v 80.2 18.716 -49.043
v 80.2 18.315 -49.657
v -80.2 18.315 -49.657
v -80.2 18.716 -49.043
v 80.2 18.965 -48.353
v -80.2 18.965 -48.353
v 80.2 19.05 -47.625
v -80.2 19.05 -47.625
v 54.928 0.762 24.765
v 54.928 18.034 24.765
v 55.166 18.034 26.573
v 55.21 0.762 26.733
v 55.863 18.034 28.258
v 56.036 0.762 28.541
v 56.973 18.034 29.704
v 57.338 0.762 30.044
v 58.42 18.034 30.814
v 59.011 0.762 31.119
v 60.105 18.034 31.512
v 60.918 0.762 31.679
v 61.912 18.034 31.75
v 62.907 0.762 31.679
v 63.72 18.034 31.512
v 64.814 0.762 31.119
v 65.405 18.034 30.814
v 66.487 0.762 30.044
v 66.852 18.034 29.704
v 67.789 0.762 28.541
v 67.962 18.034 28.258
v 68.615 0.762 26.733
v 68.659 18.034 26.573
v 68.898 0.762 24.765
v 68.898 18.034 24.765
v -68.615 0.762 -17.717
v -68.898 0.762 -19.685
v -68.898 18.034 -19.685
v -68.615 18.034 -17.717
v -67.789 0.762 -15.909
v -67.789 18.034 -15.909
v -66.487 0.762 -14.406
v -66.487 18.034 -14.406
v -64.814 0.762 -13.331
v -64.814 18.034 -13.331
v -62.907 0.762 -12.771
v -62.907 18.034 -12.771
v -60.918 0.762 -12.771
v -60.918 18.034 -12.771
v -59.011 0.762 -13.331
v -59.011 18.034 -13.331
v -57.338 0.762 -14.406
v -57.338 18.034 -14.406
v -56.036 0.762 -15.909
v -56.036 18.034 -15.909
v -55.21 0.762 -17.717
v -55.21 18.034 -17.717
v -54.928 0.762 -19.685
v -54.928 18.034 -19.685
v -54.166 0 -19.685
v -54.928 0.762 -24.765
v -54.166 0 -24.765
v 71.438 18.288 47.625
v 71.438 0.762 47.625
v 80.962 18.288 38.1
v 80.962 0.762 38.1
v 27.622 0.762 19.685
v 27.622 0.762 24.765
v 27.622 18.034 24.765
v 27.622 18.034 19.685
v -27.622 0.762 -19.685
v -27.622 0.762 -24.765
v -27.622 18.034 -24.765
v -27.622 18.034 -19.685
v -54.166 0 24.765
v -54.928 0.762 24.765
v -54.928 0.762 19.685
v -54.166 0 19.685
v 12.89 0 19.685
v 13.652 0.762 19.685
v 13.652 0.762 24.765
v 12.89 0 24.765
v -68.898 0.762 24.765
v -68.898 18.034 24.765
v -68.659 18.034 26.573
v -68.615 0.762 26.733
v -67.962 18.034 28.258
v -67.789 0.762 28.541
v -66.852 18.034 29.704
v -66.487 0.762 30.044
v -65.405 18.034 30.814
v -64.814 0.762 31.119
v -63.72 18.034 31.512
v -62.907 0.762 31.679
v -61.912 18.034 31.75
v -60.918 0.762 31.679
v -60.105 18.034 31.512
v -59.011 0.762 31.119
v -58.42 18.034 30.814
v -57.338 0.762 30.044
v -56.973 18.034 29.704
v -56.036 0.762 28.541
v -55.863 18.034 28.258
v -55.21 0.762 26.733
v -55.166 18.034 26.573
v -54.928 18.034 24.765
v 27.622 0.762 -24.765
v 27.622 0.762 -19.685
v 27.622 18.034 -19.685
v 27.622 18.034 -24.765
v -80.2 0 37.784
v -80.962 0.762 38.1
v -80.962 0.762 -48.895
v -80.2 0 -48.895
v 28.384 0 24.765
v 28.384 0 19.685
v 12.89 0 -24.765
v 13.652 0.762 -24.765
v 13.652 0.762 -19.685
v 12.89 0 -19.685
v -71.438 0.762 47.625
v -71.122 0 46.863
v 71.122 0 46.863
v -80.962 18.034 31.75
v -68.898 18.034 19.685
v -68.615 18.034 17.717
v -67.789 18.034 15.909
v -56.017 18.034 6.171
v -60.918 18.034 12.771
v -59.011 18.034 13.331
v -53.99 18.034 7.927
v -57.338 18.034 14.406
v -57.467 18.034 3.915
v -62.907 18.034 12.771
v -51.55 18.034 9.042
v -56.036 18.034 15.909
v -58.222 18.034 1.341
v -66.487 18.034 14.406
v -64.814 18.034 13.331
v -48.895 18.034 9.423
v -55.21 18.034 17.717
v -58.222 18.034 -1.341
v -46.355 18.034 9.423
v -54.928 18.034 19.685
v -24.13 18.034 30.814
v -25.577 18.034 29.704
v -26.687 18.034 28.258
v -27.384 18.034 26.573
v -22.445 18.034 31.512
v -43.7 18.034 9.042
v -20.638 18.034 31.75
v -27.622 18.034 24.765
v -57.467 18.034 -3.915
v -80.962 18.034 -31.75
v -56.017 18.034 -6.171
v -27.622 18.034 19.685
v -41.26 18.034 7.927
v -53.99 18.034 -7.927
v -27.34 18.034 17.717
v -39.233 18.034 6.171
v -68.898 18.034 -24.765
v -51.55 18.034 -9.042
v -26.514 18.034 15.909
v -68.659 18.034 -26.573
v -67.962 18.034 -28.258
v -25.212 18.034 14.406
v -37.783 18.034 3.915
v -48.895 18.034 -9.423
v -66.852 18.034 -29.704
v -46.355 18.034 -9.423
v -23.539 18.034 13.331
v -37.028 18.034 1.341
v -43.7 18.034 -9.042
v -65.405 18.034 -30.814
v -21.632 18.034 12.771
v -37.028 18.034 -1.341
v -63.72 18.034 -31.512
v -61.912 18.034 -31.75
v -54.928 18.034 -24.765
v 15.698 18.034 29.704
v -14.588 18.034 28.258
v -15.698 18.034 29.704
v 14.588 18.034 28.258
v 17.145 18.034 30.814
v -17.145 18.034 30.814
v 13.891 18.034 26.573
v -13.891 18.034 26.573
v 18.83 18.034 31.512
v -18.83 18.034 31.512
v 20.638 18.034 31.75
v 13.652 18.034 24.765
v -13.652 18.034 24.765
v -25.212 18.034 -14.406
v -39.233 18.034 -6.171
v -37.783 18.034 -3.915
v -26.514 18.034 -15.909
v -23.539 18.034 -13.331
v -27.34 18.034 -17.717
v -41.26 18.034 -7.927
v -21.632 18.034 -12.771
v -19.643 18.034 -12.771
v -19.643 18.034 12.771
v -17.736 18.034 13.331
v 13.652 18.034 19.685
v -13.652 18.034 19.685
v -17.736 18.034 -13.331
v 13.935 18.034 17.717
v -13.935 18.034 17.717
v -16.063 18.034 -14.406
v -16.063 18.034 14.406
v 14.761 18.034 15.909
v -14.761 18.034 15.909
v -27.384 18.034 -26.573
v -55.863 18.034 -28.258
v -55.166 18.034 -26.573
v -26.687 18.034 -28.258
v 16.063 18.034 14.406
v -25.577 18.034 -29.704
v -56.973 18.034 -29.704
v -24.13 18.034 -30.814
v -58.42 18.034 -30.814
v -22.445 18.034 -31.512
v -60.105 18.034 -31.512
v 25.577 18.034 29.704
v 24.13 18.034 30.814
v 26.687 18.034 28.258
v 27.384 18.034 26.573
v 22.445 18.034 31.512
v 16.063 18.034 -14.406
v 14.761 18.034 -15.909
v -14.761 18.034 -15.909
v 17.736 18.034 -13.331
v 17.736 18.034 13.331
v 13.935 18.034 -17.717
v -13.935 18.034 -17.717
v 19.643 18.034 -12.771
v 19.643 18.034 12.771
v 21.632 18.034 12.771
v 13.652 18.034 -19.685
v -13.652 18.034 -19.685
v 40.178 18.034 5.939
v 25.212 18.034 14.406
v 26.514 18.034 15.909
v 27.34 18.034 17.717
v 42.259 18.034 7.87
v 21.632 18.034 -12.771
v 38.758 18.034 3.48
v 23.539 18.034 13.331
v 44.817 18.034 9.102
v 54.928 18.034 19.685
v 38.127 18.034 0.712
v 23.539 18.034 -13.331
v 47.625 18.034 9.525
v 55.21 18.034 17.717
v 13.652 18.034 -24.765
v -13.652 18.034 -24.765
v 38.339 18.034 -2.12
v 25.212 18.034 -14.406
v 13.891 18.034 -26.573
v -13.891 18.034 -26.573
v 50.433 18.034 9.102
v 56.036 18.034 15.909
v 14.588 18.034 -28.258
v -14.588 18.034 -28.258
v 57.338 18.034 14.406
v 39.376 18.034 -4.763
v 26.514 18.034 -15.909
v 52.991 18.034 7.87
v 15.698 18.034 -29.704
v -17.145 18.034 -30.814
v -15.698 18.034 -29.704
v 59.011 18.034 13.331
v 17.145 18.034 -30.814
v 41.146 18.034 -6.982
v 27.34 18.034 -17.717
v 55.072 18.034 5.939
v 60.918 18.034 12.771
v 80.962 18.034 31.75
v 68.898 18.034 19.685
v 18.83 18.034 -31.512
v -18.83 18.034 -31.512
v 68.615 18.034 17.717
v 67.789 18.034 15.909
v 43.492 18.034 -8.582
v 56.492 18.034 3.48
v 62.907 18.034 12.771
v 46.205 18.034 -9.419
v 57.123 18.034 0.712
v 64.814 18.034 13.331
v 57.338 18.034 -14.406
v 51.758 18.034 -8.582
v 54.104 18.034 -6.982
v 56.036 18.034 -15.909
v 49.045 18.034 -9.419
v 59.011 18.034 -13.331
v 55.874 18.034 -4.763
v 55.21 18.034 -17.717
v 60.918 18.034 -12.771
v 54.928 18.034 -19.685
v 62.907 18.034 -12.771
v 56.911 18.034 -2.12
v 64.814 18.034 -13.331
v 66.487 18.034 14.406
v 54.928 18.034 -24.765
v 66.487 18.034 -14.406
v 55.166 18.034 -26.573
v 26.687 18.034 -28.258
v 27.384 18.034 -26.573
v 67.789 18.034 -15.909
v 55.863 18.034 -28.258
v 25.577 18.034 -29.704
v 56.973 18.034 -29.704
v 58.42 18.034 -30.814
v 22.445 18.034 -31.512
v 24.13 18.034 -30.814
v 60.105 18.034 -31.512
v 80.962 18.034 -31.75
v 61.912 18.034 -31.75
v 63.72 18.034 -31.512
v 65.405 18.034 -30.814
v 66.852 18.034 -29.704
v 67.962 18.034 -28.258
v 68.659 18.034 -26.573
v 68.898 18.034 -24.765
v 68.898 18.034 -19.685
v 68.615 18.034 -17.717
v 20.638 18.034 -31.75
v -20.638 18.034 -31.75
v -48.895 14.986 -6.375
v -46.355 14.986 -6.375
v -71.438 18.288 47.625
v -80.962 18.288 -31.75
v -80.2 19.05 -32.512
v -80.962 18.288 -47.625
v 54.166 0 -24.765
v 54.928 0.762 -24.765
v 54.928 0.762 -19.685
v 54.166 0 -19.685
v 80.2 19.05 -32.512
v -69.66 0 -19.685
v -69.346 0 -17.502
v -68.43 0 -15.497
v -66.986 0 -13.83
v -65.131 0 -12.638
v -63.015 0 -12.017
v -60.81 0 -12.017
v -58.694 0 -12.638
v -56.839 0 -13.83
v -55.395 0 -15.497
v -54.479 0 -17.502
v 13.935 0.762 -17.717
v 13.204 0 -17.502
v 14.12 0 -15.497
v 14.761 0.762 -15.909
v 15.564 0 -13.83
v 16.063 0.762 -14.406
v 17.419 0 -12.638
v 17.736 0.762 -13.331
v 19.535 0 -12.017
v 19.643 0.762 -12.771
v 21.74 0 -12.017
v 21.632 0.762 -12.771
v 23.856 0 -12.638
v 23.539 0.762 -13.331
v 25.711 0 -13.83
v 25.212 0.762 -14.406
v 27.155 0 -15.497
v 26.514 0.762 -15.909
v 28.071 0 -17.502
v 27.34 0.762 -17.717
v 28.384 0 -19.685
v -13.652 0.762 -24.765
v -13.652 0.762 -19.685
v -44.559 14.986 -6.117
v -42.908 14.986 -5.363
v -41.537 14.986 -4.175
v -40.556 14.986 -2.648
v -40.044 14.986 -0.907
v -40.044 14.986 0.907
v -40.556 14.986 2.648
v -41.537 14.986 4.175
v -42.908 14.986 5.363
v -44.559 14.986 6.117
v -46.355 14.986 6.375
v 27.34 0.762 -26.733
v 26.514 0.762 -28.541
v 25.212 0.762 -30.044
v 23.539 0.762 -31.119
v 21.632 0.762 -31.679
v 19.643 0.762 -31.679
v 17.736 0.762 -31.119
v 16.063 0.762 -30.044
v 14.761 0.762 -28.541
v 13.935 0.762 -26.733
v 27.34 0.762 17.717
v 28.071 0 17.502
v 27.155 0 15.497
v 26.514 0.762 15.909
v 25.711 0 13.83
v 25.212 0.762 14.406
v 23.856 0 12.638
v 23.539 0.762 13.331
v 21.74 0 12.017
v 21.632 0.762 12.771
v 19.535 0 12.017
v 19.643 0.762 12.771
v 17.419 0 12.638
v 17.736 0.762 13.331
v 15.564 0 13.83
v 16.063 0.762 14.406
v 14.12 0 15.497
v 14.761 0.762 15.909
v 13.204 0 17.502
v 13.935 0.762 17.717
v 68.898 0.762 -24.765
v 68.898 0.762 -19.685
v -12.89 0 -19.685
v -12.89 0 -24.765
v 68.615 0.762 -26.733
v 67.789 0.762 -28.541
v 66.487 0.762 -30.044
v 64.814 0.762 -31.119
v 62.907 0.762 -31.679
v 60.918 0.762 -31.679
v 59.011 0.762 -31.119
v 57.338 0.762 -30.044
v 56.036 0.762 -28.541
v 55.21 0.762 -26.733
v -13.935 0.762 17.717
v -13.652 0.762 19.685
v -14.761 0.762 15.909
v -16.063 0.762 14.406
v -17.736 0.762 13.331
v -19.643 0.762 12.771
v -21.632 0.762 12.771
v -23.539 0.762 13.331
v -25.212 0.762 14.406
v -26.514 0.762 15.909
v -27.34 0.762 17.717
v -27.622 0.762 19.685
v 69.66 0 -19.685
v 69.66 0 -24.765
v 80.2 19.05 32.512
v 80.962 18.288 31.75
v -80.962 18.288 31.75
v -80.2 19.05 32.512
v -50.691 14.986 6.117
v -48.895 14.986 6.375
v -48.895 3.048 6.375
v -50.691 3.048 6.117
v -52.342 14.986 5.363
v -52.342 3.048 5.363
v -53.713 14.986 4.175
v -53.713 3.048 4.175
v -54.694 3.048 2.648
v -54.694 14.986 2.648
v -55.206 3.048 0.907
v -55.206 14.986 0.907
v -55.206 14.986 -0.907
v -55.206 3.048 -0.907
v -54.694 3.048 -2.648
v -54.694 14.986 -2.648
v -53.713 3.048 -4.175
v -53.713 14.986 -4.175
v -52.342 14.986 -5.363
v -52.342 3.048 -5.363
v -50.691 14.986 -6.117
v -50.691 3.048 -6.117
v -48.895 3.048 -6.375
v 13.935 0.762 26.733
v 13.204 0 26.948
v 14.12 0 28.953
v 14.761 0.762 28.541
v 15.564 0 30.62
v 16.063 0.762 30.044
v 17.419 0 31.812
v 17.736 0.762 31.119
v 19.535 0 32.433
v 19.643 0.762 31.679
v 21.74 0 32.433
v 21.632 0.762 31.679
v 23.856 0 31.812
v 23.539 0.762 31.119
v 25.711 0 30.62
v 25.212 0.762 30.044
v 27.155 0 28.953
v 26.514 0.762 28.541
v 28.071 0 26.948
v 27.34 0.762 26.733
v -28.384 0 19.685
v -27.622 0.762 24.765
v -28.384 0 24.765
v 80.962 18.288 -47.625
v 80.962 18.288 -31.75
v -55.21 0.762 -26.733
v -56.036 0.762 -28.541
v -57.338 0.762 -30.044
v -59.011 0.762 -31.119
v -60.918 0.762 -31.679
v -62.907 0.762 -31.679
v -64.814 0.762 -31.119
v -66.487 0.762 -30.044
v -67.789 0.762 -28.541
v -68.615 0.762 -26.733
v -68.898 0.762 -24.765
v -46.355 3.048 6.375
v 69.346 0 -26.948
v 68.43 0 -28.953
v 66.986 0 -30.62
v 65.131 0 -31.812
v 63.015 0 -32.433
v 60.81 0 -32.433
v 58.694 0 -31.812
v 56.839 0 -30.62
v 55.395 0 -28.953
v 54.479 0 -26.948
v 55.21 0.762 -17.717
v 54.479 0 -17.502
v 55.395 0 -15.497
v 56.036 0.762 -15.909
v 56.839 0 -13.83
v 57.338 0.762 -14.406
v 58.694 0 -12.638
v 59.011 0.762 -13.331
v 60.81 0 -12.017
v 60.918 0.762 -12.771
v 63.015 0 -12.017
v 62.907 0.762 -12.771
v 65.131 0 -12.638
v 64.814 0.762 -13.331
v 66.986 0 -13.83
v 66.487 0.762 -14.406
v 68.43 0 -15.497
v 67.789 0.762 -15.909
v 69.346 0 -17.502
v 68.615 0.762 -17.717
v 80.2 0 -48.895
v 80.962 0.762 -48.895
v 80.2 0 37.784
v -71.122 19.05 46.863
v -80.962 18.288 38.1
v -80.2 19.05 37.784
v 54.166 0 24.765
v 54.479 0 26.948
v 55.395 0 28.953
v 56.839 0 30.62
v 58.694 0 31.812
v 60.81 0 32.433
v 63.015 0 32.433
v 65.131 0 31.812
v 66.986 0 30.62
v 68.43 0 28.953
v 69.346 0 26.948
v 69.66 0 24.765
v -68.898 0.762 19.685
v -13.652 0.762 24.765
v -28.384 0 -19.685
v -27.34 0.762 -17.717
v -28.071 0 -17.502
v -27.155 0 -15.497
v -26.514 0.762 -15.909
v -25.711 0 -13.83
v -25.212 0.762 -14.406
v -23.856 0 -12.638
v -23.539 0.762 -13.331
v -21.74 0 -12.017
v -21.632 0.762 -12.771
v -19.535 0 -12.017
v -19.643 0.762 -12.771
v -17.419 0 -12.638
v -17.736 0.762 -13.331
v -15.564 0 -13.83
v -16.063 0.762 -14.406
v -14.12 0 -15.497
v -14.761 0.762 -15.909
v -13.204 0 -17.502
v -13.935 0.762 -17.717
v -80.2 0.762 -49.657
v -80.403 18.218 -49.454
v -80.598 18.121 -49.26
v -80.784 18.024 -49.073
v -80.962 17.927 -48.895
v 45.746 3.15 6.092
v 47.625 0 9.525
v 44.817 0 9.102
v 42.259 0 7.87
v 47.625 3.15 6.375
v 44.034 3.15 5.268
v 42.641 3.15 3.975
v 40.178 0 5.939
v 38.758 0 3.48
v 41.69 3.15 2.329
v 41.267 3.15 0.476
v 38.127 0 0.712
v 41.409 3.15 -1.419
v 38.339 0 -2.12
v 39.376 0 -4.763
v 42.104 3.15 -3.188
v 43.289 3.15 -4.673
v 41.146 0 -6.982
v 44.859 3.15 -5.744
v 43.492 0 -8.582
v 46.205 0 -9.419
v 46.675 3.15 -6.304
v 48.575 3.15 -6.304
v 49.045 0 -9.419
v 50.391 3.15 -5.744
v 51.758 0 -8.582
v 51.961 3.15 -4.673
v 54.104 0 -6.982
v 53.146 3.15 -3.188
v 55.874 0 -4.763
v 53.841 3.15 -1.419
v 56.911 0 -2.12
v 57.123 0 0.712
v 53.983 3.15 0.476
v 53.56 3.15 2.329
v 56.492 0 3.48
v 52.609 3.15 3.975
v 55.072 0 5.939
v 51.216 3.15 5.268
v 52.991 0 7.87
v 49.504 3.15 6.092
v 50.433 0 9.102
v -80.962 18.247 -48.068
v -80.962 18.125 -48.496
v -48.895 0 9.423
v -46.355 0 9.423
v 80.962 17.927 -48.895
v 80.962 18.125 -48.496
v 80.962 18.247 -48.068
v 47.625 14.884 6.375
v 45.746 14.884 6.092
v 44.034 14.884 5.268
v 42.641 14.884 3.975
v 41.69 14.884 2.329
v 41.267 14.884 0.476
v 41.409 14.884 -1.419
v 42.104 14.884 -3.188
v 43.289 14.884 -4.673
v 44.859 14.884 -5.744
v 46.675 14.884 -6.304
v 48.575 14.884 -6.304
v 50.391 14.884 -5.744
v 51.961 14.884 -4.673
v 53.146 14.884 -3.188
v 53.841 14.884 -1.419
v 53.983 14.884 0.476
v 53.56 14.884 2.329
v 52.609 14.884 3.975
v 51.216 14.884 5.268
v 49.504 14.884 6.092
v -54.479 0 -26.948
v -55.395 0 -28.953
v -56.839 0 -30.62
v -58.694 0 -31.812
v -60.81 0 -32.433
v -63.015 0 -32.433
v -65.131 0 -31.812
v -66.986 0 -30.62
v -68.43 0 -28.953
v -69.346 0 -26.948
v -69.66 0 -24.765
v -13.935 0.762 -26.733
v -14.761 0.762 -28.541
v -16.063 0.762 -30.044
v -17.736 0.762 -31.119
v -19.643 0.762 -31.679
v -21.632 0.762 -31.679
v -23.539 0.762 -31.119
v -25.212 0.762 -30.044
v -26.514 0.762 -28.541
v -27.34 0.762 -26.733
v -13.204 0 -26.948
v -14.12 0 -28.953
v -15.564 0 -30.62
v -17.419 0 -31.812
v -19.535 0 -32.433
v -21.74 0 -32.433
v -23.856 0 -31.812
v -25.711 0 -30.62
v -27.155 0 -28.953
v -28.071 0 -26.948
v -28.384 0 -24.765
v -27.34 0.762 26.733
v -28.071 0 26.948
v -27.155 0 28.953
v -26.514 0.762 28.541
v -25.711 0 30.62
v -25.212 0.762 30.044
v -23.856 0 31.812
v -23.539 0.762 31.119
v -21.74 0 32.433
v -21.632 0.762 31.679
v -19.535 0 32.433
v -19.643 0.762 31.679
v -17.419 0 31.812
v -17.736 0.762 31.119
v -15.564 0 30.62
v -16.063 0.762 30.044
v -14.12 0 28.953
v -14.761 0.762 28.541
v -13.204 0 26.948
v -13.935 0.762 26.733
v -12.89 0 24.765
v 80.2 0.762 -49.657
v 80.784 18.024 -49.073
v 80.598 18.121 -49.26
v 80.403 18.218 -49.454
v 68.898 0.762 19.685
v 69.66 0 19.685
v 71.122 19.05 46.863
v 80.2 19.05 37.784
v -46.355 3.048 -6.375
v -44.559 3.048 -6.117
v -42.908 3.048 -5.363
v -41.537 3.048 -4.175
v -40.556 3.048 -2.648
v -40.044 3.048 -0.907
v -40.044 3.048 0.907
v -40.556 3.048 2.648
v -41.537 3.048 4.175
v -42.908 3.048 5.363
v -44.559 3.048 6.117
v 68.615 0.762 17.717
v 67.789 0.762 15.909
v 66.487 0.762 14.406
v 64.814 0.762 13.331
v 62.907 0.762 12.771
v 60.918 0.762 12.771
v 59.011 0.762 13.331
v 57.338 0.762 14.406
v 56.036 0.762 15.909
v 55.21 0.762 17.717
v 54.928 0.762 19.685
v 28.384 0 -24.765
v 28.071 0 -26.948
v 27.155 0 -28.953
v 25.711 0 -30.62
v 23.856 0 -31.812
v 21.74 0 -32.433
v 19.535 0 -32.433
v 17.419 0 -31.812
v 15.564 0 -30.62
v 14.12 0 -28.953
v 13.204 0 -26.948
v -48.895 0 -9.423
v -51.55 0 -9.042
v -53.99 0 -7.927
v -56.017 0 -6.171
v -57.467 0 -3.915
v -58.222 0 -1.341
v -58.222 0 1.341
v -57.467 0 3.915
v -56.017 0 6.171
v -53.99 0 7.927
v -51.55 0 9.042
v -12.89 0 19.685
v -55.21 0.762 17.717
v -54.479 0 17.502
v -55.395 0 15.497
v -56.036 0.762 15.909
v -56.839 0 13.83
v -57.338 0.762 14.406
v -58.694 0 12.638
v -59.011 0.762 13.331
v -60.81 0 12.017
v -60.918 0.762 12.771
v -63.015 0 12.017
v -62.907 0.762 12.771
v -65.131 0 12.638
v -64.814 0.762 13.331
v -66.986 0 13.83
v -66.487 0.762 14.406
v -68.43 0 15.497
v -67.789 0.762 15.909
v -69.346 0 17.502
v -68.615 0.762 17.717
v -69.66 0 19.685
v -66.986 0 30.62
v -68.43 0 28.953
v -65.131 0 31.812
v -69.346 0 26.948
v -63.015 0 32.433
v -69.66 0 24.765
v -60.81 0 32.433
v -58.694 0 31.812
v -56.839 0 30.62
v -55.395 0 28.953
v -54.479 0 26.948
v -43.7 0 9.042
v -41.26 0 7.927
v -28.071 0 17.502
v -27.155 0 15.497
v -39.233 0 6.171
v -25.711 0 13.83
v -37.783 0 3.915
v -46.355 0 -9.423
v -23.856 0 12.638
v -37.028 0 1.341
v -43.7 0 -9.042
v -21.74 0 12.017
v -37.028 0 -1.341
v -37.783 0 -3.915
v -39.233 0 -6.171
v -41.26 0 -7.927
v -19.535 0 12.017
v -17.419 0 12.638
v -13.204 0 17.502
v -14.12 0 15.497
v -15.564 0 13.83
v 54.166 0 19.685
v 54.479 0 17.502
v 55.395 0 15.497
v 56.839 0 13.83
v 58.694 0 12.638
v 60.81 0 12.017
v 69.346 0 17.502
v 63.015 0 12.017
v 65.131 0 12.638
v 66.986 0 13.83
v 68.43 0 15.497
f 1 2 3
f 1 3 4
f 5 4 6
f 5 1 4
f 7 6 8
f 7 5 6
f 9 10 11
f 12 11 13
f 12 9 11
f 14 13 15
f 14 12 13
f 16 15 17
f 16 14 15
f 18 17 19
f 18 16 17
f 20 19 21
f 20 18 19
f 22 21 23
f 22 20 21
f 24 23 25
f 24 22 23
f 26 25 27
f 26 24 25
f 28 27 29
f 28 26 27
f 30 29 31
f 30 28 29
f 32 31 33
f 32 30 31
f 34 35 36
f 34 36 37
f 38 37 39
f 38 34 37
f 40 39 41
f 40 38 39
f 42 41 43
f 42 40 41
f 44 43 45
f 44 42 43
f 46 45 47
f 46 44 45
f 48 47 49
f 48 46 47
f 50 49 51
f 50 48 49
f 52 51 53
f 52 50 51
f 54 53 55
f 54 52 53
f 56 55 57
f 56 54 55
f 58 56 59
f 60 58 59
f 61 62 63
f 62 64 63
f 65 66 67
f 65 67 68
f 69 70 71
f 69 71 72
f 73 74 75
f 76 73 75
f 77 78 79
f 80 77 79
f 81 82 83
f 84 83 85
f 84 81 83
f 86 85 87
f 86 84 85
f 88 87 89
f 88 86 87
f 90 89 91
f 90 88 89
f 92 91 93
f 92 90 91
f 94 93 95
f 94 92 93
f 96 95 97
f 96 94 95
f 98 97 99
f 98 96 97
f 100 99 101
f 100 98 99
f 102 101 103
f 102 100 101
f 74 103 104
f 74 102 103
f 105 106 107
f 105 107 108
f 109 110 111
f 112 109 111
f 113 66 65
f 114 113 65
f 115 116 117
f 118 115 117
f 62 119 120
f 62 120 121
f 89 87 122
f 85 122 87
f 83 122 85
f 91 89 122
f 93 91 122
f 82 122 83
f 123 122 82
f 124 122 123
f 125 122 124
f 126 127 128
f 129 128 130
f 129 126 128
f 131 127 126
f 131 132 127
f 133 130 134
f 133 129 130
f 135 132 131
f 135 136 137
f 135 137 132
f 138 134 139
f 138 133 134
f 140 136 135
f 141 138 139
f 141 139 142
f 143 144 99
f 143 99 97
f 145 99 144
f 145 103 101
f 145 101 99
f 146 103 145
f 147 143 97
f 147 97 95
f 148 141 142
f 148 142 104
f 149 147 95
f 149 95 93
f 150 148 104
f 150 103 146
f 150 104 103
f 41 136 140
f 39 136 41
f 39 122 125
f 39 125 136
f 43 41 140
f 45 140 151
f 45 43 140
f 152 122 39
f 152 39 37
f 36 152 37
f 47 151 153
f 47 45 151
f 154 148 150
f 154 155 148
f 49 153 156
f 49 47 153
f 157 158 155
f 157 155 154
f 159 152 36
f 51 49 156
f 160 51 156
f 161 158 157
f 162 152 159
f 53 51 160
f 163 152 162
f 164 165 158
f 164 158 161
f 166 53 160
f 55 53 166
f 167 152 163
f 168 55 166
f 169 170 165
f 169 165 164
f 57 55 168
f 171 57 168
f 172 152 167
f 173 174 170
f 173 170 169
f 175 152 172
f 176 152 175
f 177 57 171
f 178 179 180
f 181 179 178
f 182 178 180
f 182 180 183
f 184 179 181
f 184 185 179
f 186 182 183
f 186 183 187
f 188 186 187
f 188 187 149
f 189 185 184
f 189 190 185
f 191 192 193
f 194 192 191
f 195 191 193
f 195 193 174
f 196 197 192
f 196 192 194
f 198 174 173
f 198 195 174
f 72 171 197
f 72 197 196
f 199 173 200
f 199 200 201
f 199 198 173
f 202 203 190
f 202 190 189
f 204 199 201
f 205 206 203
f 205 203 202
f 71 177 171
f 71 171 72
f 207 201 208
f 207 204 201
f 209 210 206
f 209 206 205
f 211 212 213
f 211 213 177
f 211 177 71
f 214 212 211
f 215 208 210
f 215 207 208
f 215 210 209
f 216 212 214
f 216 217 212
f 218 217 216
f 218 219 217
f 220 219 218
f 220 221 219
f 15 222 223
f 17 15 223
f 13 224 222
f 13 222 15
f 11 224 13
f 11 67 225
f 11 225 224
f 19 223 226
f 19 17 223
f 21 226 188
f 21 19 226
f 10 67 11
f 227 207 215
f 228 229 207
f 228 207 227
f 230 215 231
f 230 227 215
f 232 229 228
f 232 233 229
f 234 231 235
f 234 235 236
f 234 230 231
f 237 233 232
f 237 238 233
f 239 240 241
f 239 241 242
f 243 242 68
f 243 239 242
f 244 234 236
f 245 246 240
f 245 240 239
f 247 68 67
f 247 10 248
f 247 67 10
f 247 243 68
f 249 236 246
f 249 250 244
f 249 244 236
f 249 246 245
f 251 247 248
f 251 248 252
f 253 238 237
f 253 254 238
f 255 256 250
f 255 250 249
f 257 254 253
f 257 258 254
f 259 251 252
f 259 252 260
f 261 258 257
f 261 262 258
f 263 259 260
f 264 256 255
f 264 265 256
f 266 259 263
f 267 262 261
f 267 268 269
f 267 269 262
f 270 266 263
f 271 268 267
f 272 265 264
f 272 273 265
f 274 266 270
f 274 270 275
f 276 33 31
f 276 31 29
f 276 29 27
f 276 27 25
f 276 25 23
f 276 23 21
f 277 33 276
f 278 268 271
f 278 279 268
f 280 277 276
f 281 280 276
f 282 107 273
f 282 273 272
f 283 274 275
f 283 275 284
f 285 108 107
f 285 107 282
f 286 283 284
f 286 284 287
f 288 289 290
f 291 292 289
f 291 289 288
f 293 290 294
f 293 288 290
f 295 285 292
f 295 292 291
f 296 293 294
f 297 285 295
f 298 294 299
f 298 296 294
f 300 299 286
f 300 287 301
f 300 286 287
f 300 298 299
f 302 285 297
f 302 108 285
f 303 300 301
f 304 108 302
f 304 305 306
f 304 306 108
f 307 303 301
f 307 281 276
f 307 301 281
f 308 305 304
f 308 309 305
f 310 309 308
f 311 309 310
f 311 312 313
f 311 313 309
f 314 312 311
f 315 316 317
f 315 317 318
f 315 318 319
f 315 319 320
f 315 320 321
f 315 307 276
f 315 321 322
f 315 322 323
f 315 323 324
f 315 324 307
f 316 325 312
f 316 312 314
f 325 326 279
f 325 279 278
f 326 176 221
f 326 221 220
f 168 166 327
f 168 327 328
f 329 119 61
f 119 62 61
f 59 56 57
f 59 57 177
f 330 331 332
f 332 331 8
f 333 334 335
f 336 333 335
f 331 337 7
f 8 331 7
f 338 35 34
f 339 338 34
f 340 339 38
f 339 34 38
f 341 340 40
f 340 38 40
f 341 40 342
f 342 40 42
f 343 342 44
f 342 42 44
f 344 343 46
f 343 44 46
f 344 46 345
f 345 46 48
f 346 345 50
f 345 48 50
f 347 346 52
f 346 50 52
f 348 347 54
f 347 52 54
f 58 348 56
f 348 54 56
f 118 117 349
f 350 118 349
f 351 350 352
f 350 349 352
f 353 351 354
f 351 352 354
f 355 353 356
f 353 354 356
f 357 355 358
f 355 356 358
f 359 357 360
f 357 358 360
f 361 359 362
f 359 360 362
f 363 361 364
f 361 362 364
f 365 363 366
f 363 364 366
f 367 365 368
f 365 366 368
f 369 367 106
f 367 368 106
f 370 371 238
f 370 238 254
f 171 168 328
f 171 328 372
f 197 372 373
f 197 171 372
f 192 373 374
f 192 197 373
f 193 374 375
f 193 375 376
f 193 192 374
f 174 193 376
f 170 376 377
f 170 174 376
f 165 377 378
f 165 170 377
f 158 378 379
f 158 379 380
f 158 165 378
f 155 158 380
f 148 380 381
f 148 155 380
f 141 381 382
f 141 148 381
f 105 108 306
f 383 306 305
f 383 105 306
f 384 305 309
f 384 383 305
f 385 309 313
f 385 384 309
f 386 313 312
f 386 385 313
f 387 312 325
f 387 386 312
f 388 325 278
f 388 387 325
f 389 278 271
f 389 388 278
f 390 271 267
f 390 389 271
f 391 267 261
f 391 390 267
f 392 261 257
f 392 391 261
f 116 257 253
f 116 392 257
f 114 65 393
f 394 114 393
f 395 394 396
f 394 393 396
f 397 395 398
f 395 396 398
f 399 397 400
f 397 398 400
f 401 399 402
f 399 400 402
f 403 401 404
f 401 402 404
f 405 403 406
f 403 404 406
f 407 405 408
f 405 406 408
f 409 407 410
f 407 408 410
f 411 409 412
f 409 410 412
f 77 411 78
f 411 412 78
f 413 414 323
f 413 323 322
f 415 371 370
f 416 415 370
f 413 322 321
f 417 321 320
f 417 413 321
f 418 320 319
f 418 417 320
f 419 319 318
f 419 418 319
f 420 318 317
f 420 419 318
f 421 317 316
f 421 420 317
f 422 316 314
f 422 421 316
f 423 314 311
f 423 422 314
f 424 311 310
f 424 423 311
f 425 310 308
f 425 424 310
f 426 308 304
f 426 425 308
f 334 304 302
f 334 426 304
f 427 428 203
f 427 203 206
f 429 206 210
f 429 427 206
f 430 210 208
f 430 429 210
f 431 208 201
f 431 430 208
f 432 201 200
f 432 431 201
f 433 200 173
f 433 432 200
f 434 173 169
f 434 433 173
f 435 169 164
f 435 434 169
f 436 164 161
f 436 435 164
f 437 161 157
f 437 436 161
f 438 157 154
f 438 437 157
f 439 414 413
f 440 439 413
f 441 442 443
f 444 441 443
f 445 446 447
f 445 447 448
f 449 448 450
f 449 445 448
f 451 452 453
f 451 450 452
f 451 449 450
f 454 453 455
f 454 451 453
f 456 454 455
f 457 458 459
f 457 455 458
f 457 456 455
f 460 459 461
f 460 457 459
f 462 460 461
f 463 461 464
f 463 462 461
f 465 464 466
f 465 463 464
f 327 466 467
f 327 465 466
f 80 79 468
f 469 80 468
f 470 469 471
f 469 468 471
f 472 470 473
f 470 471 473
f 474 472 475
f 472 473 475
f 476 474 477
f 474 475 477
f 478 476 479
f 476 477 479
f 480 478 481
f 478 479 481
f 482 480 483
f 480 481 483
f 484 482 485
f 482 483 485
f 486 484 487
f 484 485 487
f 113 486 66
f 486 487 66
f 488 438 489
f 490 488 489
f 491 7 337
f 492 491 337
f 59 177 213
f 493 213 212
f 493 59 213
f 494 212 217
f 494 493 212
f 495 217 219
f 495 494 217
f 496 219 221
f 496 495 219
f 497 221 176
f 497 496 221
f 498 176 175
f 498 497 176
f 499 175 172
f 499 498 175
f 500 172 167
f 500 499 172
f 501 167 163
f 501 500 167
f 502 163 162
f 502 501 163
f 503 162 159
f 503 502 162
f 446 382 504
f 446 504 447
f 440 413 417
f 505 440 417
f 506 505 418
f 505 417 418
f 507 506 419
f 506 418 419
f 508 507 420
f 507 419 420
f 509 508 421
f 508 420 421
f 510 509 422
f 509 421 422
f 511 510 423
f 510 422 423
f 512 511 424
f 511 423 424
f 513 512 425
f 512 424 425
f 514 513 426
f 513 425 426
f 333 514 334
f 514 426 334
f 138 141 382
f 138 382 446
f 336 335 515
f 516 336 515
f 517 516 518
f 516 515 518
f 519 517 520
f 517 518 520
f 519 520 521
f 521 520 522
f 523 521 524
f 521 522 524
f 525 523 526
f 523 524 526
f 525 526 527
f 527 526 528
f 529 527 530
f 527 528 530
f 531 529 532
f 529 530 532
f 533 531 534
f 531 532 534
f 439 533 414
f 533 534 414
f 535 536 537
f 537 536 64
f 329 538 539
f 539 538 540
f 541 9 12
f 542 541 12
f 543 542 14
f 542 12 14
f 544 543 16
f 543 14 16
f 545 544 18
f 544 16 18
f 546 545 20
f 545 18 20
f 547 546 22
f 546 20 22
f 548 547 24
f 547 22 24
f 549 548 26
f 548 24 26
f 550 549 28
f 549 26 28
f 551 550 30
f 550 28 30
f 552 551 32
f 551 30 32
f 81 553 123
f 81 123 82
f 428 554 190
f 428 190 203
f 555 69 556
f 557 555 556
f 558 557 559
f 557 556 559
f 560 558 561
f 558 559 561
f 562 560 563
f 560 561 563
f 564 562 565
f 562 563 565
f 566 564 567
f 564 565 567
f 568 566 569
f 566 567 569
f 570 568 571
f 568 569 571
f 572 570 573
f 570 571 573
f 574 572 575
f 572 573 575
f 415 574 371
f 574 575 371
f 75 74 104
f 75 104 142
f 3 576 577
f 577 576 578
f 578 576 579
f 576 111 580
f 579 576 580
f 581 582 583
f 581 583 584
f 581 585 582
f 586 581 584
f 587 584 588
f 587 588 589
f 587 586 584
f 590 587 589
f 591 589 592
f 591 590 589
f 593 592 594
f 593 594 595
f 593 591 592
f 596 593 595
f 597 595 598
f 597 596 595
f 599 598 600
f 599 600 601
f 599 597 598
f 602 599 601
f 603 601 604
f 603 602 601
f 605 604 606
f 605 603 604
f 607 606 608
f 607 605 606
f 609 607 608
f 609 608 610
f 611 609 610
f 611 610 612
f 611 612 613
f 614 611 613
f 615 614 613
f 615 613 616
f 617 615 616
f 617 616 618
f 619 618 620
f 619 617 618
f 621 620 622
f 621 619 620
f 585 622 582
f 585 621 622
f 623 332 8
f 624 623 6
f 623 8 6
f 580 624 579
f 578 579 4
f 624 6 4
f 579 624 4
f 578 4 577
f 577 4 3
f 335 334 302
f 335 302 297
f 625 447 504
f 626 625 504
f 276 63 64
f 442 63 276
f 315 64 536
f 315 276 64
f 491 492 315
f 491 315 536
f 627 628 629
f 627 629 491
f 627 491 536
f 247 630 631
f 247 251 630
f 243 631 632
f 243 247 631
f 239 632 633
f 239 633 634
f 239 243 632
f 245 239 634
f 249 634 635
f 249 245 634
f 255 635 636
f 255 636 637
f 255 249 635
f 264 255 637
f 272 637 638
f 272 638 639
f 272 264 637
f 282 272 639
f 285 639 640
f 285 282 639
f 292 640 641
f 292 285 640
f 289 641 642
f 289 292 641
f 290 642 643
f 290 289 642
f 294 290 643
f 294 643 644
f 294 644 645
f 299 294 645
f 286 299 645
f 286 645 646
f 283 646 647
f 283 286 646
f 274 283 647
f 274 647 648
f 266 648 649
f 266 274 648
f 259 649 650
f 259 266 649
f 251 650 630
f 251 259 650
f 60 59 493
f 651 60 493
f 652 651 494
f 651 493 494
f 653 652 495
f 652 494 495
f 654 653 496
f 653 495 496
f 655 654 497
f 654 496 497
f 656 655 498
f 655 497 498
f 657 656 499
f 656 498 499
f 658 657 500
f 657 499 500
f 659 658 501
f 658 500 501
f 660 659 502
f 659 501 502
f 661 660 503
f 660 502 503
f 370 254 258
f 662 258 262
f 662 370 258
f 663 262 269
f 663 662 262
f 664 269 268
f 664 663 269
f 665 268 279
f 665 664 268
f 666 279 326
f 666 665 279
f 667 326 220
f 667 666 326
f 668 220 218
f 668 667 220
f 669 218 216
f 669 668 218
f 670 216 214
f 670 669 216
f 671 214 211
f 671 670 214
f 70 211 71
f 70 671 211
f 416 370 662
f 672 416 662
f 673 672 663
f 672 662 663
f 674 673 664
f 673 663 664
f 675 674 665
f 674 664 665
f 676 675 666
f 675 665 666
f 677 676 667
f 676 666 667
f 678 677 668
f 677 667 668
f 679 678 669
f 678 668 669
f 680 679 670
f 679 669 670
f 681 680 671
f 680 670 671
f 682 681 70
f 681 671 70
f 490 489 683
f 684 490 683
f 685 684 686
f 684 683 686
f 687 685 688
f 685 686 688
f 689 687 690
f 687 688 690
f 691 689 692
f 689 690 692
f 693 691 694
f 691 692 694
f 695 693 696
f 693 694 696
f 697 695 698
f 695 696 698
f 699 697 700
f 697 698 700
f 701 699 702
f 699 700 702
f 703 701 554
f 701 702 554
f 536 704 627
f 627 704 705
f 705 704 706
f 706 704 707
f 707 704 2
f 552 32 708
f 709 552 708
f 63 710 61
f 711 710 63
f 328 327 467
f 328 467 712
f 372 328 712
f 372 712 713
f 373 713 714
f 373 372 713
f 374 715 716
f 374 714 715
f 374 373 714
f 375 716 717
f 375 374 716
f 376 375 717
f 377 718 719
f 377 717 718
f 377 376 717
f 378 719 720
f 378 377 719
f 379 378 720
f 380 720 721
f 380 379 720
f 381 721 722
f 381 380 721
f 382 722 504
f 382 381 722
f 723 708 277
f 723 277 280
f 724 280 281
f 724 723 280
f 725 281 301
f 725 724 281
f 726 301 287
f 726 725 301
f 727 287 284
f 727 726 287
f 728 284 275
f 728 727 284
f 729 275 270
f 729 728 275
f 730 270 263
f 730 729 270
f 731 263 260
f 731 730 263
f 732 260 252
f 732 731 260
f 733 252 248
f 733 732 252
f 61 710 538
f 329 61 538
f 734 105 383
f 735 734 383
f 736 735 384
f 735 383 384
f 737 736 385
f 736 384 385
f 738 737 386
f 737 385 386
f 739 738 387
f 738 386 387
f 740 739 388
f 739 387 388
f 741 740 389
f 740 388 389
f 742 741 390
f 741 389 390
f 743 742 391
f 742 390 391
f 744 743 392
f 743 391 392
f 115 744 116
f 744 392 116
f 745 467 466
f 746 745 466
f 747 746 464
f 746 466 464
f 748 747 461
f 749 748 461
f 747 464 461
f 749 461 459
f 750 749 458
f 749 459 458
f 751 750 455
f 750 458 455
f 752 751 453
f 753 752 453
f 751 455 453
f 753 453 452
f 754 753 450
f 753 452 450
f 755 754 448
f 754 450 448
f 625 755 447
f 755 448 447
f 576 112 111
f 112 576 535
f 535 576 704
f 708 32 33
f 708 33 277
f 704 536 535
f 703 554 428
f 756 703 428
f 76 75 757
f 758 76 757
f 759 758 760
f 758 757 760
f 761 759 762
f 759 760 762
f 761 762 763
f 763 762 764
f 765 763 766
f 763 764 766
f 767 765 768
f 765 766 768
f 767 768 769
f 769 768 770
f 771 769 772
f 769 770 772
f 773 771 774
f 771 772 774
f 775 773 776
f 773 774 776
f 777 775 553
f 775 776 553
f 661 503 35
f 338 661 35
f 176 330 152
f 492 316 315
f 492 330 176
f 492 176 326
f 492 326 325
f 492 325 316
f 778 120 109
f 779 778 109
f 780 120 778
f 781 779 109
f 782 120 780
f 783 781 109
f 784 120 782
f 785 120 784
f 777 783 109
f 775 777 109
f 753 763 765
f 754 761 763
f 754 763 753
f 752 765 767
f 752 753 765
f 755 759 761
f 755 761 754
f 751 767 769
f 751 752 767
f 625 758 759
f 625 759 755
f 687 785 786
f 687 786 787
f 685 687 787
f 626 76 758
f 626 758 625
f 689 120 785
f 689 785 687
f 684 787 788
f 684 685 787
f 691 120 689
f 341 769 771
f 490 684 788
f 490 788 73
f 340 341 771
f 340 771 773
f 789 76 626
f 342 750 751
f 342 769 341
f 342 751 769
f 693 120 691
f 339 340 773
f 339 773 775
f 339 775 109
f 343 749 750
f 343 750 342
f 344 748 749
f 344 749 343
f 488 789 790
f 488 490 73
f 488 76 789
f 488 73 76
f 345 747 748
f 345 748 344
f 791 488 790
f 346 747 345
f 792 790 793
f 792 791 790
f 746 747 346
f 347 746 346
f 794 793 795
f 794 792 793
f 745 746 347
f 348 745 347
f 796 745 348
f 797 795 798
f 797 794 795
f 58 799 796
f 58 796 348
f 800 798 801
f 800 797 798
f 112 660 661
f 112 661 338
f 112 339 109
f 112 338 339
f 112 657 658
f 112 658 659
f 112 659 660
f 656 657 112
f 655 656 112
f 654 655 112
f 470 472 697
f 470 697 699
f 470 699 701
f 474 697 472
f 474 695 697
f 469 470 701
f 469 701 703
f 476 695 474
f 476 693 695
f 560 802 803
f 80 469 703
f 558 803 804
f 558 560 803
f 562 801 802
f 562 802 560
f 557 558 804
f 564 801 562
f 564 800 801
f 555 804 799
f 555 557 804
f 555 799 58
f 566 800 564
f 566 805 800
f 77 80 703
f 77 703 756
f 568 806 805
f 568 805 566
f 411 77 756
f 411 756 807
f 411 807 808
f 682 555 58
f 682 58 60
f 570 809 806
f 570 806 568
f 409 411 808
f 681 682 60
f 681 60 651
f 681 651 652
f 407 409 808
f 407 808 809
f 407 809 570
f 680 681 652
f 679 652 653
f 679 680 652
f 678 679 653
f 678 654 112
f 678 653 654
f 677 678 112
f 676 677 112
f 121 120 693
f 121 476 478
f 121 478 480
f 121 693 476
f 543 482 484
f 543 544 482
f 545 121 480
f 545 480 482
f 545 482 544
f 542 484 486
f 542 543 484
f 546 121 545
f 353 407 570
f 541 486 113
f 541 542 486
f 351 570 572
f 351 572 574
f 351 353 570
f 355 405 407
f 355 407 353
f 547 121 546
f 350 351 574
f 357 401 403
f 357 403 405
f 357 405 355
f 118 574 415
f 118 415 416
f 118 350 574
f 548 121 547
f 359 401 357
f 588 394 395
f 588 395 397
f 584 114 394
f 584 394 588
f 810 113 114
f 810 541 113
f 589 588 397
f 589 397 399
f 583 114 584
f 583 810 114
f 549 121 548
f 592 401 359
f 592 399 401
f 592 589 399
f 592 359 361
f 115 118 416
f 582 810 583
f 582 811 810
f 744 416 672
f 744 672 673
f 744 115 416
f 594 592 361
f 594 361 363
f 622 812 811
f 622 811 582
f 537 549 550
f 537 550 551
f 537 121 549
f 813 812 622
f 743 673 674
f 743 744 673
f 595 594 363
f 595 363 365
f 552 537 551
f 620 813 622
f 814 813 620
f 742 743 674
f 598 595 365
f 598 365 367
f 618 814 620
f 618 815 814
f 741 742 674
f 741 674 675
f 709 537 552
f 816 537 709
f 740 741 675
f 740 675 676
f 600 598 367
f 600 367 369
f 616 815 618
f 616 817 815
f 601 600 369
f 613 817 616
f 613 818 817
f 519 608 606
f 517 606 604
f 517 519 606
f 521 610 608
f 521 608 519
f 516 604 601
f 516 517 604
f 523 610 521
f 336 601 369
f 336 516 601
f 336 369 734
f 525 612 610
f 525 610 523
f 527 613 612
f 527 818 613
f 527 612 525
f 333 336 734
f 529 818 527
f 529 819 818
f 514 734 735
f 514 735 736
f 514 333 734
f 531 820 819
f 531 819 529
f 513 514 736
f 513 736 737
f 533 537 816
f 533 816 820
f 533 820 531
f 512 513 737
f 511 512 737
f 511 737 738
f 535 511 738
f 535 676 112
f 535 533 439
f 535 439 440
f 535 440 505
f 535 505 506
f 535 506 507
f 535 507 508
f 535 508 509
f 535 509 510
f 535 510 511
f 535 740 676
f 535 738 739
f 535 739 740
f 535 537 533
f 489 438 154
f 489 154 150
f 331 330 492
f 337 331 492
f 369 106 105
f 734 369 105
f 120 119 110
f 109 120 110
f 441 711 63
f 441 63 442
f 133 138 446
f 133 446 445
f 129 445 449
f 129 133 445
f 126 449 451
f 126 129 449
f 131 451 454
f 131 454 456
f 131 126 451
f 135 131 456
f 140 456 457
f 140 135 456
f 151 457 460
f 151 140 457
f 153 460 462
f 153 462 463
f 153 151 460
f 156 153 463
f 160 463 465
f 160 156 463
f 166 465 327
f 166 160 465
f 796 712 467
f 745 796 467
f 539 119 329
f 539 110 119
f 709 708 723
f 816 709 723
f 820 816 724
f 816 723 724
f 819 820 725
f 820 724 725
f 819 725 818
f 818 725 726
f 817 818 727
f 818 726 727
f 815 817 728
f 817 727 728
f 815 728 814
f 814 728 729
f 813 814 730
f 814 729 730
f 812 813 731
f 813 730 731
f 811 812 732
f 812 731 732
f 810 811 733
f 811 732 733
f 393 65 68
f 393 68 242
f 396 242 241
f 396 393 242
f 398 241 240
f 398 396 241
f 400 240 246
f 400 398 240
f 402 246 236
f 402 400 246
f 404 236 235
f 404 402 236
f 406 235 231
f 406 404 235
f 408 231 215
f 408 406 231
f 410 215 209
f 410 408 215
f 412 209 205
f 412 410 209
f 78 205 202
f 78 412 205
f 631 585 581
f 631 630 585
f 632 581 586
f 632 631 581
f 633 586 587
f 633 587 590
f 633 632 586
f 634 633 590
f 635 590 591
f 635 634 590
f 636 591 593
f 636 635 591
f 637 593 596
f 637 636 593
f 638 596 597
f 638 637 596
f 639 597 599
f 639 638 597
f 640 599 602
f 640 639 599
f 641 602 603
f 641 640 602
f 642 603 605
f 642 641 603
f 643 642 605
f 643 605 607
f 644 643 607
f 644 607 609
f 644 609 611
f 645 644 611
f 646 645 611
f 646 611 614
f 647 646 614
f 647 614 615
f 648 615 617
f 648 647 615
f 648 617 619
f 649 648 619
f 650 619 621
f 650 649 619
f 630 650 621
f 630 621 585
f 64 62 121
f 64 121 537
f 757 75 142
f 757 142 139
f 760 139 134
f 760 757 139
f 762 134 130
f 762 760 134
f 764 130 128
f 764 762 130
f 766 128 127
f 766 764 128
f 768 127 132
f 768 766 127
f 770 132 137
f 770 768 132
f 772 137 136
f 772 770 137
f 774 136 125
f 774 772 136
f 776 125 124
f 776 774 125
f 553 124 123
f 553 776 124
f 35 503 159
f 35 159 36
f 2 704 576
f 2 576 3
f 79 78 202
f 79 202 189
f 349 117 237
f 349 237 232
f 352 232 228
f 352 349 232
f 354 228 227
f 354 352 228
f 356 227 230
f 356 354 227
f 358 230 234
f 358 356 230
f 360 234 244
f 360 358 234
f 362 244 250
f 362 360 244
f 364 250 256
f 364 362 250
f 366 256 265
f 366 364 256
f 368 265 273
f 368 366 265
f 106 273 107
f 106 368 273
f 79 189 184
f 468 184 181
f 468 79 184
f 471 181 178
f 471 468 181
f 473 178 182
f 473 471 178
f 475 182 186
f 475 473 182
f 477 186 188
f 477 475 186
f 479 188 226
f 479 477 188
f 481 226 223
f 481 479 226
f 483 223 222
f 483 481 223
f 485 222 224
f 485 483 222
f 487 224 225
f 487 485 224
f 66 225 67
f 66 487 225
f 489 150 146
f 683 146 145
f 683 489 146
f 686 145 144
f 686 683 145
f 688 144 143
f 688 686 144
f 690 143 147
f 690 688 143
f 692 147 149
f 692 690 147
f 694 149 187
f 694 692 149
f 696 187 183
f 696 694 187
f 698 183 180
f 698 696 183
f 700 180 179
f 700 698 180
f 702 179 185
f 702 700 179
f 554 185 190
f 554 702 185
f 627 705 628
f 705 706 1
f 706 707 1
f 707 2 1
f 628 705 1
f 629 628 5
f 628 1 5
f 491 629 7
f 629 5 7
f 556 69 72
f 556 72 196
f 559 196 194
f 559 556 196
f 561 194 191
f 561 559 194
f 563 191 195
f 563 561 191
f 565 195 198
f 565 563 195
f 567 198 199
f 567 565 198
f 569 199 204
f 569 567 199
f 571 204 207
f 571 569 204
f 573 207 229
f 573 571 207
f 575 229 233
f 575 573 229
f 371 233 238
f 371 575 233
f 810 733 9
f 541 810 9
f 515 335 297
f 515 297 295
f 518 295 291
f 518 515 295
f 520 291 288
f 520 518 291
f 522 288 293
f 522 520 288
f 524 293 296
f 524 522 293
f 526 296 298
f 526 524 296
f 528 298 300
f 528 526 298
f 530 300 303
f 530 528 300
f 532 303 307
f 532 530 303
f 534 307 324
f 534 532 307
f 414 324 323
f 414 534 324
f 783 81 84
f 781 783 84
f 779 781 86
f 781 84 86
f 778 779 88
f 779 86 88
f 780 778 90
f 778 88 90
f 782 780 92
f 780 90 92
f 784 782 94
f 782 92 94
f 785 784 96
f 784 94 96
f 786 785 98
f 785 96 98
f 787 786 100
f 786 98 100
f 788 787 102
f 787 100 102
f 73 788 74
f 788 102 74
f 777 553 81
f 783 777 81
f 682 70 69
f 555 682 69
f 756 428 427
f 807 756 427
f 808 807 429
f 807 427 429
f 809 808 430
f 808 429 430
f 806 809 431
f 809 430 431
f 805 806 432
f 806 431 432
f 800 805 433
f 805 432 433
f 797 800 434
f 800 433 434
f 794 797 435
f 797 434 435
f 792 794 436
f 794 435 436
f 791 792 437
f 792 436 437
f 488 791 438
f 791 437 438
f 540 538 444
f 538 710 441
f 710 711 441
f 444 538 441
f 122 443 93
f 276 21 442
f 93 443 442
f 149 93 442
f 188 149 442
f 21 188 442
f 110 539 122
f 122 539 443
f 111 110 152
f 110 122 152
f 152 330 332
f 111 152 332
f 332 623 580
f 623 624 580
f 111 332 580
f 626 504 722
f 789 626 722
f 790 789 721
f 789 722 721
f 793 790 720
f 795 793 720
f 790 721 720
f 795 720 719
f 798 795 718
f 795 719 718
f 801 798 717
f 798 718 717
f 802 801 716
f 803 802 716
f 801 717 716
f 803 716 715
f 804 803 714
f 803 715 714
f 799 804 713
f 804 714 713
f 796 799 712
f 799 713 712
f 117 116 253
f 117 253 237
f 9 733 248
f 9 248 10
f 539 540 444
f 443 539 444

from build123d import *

# Parameters (mm, degrees)
SKETCH1_W      = 95.25
SKETCH1_H      = 19.05
EXTRUDE1_DEPTH = 80.9625
CHAMFER1_SIZE  = 9.525
SKETCH6_W      = 161.925
SKETCH6_H      = 63.5
EXTRUDE2_DEPTH = 1.016
EXTRUDE5_DEPTH = 80.9625
EXTRUDE8_DEPTH = 20.05
CHAMFER8_SIZE  = 0.762
EXTRUDE9_DEPTH = 19.034
CHAMFER9_SIZE  = 3.048
CHAMFER6_SIZE  = 0.762


with BuildPart() as part:
    # Sketch1 → Extrude1 (new body, symmetric)
    with BuildSketch(Plane(origin=(0, 0, 0), x_dir=(0, 0, -1), z_dir=(1, 0, 0))):
        with Locations((0, 9.525)):
            Rectangle(SKETCH1_W, SKETCH1_H)
    extrude(amount=EXTRUDE1_DEPTH, both=True)

    # Chamfer1
    chamfer1_edges = [part.edges().sort_by_distance(p)[0] for p in [
        (80.9625, 9.525, 47.625),
        (-80.9625, 9.525, 47.625),
    ]]
    chamfer(chamfer1_edges, length=CHAMFER1_SIZE)

    # Sketch6 → Extrude2 (cut)
    with BuildSketch(Plane(origin=(0, 19.05, 0), x_dir=(1, 0, 0), z_dir=(0, 1, 0))):
        Rectangle(SKETCH6_W, SKETCH6_H)
    extrude(amount=-EXTRUDE2_DEPTH, mode=Mode.SUBTRACT)

    # Sketch10 → Extrude5 (add, symmetric)
    with BuildSketch(Plane(origin=(0, 0, 0), x_dir=(0, 0, -1), z_dir=(1, 0, 0))):
        with BuildLine():
            Line((47.117, 19.05), (47.117, 0))
            Line((47.117, 0), (49.657, 0))
            Line((49.657, 0), (49.657, 18.314590334))
            ThreePointArc((49.657, 18.314590334), (48.705491945, 18.860491945), (47.625, 19.05))
            Line((47.625, 19.05), (47.117, 19.05))
        make_face()
    extrude(amount=EXTRUDE5_DEPTH, both=True)

    # Sketch16 → Extrude8 (cut, through all)
    with BuildSketch(Plane.XZ):
        with BuildLine():
            Line((-54.9275, 24.765), (-54.9275, 19.685))
            ThreePointArc((-54.9275, 19.685), (-61.9125, 12.7), (-68.8975, 19.685))
            Line((-68.8975, 19.685), (-68.8975, 24.765))
            ThreePointArc((-68.8975, 24.765), (-61.9125, 31.75), (-54.9275, 24.765))
        make_face()
        with BuildLine():
            Line((-54.9275, -19.685), (-54.9275, -24.765))
            ThreePointArc((-54.9275, -24.765), (-61.9125, -31.75), (-68.8975, -24.765))
            Line((-68.8975, -24.765), (-68.8975, -19.685))
            ThreePointArc((-68.8975, -19.685), (-61.9125, -12.7), (-54.9275, -19.685))
        make_face()
        with BuildLine():
            Line((-13.6525, -19.685), (-13.6525, -24.765))
            ThreePointArc((-13.6525, -24.765), (-20.6375, -31.75), (-27.6225, -24.765))
            Line((-27.6225, -24.765), (-27.6225, -19.685))
            ThreePointArc((-27.6225, -19.685), (-20.6375, -12.7), (-13.6525, -19.685))
        make_face()
        with BuildLine():
            Line((27.6225, -19.685), (27.6225, -24.765))
            ThreePointArc((27.6225, -24.765), (20.6375, -31.75), (13.6525, -24.765))
            Line((13.6525, -24.765), (13.6525, -19.685))
            ThreePointArc((13.6525, -19.685), (20.6375, -12.7), (27.6225, -19.685))
        make_face()
        with BuildLine():
            Line((68.8975, -19.685), (68.8975, -24.765))
            ThreePointArc((68.8975, -24.765), (61.9125, -31.75), (54.9275, -24.765))
            Line((54.9275, -24.765), (54.9275, -19.685))
            ThreePointArc((54.9275, -19.685), (61.9125, -12.7), (68.8975, -19.685))
        make_face()
        with BuildLine():
            Line((68.8975, 24.765), (68.8975, 19.685))
            ThreePointArc((68.8975, 19.685), (61.9125, 12.7), (54.9275, 19.685))
            Line((54.9275, 19.685), (54.9275, 24.765))
            ThreePointArc((54.9275, 24.765), (61.9125, 31.75), (68.8975, 24.765))
        make_face()
        with BuildLine():
            Line((27.6225, 24.765), (27.6225, 19.685))
            ThreePointArc((27.6225, 19.685), (20.6375, 12.7), (13.6525, 19.685))
            Line((13.6525, 19.685), (13.6525, 24.765))
            ThreePointArc((13.6525, 24.765), (20.6375, 31.75), (27.6225, 24.765))
        make_face()
        with BuildLine():
            Line((-13.6525, 24.765), (-13.6525, 19.685))
            ThreePointArc((-13.6525, 19.685), (-20.6375, 12.7), (-27.6225, 19.685))
            Line((-27.6225, 19.685), (-27.6225, 24.765))
            ThreePointArc((-27.6225, 24.765), (-20.6375, 31.75), (-13.6525, 24.765))
        make_face()
    extrude(amount=-EXTRUDE8_DEPTH, mode=Mode.SUBTRACT)

    # Chamfer8
    chamfer8_edges = [part.edges().sort_by_distance(p)[0] for p in [
        (-20.6375, 0, -12.7),
        (-27.6225, 0, -22.225),
        (-20.6375, 0, -31.75),
        (-13.6525, 0, -22.225),
        (20.6375, 0, -12.7),
        (13.6525, 0, -22.225),
        (20.6375, 0, -31.75),
        (27.6225, 0, -22.225),
        (61.9125, 0, -12.7),
        (54.9275, 0, -22.225),
        (61.9125, 0, -31.75),
        (68.8975, 0, -22.225),
        (61.9125, 0, 31.75),
        (54.9275, 0, 22.225),
        (61.9125, 0, 12.7),
        (68.8975, 0, 22.225),
        (20.6375, 0, 31.75),
        (13.6525, 0, 22.225),
        (20.6375, 0, 12.7),
        (27.6225, 0, 22.225),
        (-20.6375, 0, 31.75),
        (-27.6225, 0, 22.225),
        (-20.6375, 0, 12.7),
        (-13.6525, 0, 22.225),
        (-61.9125, 0, 31.75),
        (-68.8975, 0, 22.225),
        (-61.9125, 0, 12.7),
        (-54.9275, 0, 22.225),
        (-61.9125, 0, -12.7),
        (-68.8975, 0, -22.225),
        (-61.9125, 0, -31.75),
        (-54.9275, 0, -22.225),
    ]]
    chamfer(chamfer8_edges, length=CHAMFER8_SIZE)

    # Sketch17 → 1/2 (0.5) Diameter Hole2 (revolve, cut)
    with BuildSketch(Plane(origin=(47.625, 18.034, 0), x_dir=(0, 0, 1), z_dir=(1, 0, 0))):
        Polygon((0, 0), (0, 18.034), (9.525, 18.034), (6.3754, 14.8844), (6.3754, 3.1496), (9.525, 0), align=None)
    revolve(axis=Axis((47.625, 24.384, 0), (0, -1, 0)), mode=Mode.SUBTRACT)

    # Sketch20 → Extrude9 (cut, through all)
    with BuildSketch(Plane(origin=(0, 18.034, 0), x_dir=(1, 0, 0), z_dir=(0, 1, 0))):
        with BuildLine():
            Line((-48.895, 6.3754), (-46.355, 6.3754))
            ThreePointArc((-46.355, 6.3754), (-39.9796, 0), (-46.355, -6.3754))
            Line((-46.355, -6.3754), (-48.895, -6.3754))
            ThreePointArc((-48.895, -6.3754), (-55.2704, 0), (-48.895, 6.3754))
        make_face()
    extrude(amount=-EXTRUDE9_DEPTH, mode=Mode.SUBTRACT)

    # Chamfer9
    chamfer9_edges = [part.edges().sort_by_distance(p)[0] for p in [
        (-55.2704, 0, 0),
        (-47.625, 0, -6.3754),
        (-39.9796, 0, 0),
        (-47.625, 0, 6.3754),
        (-55.2704, 18.034, 0),
        (-47.625, 18.034, 6.3754),
        (-39.9796, 18.034, 0),
        (-47.625, 18.034, -6.3754),
    ]]
    chamfer(chamfer9_edges, length=CHAMFER9_SIZE)

    # Chamfer6
    chamfer6_edges = [part.edges().sort_by_distance(p)[0] for p in [
        (80.9625, 19.05, -39.6875),
        (0, 0, 47.625),
        (0, 19.05, 47.625),
        (-80.9625, 0, -5.7785),
        (80.9625, 0, -5.7785),
        (76.2, 0, 42.8625),
        (-76.2, 0, 42.8625),
        (76.2, 19.05, 42.8625),
        (-76.2, 19.05, 42.8625),
        (-80.9625, 19.05, 34.925),
        (80.9625, 19.05, 34.925),
        (0, 19.05, 31.75),
        (0, 19.05, -31.75),
        (-80.9625, 19.05, -39.6875),
        (80.9625, 9.157295167, -49.657),
        (80.9625, 18.860491945, -48.705491945),
        (0, 0, -49.657),
        (-80.9625, 18.860491945, -48.705491945),
        (-80.9625, 9.157295167, -49.657),
    ]]
    chamfer(chamfer6_edges, length=CHAMFER6_SIZE)


solid = part.part
